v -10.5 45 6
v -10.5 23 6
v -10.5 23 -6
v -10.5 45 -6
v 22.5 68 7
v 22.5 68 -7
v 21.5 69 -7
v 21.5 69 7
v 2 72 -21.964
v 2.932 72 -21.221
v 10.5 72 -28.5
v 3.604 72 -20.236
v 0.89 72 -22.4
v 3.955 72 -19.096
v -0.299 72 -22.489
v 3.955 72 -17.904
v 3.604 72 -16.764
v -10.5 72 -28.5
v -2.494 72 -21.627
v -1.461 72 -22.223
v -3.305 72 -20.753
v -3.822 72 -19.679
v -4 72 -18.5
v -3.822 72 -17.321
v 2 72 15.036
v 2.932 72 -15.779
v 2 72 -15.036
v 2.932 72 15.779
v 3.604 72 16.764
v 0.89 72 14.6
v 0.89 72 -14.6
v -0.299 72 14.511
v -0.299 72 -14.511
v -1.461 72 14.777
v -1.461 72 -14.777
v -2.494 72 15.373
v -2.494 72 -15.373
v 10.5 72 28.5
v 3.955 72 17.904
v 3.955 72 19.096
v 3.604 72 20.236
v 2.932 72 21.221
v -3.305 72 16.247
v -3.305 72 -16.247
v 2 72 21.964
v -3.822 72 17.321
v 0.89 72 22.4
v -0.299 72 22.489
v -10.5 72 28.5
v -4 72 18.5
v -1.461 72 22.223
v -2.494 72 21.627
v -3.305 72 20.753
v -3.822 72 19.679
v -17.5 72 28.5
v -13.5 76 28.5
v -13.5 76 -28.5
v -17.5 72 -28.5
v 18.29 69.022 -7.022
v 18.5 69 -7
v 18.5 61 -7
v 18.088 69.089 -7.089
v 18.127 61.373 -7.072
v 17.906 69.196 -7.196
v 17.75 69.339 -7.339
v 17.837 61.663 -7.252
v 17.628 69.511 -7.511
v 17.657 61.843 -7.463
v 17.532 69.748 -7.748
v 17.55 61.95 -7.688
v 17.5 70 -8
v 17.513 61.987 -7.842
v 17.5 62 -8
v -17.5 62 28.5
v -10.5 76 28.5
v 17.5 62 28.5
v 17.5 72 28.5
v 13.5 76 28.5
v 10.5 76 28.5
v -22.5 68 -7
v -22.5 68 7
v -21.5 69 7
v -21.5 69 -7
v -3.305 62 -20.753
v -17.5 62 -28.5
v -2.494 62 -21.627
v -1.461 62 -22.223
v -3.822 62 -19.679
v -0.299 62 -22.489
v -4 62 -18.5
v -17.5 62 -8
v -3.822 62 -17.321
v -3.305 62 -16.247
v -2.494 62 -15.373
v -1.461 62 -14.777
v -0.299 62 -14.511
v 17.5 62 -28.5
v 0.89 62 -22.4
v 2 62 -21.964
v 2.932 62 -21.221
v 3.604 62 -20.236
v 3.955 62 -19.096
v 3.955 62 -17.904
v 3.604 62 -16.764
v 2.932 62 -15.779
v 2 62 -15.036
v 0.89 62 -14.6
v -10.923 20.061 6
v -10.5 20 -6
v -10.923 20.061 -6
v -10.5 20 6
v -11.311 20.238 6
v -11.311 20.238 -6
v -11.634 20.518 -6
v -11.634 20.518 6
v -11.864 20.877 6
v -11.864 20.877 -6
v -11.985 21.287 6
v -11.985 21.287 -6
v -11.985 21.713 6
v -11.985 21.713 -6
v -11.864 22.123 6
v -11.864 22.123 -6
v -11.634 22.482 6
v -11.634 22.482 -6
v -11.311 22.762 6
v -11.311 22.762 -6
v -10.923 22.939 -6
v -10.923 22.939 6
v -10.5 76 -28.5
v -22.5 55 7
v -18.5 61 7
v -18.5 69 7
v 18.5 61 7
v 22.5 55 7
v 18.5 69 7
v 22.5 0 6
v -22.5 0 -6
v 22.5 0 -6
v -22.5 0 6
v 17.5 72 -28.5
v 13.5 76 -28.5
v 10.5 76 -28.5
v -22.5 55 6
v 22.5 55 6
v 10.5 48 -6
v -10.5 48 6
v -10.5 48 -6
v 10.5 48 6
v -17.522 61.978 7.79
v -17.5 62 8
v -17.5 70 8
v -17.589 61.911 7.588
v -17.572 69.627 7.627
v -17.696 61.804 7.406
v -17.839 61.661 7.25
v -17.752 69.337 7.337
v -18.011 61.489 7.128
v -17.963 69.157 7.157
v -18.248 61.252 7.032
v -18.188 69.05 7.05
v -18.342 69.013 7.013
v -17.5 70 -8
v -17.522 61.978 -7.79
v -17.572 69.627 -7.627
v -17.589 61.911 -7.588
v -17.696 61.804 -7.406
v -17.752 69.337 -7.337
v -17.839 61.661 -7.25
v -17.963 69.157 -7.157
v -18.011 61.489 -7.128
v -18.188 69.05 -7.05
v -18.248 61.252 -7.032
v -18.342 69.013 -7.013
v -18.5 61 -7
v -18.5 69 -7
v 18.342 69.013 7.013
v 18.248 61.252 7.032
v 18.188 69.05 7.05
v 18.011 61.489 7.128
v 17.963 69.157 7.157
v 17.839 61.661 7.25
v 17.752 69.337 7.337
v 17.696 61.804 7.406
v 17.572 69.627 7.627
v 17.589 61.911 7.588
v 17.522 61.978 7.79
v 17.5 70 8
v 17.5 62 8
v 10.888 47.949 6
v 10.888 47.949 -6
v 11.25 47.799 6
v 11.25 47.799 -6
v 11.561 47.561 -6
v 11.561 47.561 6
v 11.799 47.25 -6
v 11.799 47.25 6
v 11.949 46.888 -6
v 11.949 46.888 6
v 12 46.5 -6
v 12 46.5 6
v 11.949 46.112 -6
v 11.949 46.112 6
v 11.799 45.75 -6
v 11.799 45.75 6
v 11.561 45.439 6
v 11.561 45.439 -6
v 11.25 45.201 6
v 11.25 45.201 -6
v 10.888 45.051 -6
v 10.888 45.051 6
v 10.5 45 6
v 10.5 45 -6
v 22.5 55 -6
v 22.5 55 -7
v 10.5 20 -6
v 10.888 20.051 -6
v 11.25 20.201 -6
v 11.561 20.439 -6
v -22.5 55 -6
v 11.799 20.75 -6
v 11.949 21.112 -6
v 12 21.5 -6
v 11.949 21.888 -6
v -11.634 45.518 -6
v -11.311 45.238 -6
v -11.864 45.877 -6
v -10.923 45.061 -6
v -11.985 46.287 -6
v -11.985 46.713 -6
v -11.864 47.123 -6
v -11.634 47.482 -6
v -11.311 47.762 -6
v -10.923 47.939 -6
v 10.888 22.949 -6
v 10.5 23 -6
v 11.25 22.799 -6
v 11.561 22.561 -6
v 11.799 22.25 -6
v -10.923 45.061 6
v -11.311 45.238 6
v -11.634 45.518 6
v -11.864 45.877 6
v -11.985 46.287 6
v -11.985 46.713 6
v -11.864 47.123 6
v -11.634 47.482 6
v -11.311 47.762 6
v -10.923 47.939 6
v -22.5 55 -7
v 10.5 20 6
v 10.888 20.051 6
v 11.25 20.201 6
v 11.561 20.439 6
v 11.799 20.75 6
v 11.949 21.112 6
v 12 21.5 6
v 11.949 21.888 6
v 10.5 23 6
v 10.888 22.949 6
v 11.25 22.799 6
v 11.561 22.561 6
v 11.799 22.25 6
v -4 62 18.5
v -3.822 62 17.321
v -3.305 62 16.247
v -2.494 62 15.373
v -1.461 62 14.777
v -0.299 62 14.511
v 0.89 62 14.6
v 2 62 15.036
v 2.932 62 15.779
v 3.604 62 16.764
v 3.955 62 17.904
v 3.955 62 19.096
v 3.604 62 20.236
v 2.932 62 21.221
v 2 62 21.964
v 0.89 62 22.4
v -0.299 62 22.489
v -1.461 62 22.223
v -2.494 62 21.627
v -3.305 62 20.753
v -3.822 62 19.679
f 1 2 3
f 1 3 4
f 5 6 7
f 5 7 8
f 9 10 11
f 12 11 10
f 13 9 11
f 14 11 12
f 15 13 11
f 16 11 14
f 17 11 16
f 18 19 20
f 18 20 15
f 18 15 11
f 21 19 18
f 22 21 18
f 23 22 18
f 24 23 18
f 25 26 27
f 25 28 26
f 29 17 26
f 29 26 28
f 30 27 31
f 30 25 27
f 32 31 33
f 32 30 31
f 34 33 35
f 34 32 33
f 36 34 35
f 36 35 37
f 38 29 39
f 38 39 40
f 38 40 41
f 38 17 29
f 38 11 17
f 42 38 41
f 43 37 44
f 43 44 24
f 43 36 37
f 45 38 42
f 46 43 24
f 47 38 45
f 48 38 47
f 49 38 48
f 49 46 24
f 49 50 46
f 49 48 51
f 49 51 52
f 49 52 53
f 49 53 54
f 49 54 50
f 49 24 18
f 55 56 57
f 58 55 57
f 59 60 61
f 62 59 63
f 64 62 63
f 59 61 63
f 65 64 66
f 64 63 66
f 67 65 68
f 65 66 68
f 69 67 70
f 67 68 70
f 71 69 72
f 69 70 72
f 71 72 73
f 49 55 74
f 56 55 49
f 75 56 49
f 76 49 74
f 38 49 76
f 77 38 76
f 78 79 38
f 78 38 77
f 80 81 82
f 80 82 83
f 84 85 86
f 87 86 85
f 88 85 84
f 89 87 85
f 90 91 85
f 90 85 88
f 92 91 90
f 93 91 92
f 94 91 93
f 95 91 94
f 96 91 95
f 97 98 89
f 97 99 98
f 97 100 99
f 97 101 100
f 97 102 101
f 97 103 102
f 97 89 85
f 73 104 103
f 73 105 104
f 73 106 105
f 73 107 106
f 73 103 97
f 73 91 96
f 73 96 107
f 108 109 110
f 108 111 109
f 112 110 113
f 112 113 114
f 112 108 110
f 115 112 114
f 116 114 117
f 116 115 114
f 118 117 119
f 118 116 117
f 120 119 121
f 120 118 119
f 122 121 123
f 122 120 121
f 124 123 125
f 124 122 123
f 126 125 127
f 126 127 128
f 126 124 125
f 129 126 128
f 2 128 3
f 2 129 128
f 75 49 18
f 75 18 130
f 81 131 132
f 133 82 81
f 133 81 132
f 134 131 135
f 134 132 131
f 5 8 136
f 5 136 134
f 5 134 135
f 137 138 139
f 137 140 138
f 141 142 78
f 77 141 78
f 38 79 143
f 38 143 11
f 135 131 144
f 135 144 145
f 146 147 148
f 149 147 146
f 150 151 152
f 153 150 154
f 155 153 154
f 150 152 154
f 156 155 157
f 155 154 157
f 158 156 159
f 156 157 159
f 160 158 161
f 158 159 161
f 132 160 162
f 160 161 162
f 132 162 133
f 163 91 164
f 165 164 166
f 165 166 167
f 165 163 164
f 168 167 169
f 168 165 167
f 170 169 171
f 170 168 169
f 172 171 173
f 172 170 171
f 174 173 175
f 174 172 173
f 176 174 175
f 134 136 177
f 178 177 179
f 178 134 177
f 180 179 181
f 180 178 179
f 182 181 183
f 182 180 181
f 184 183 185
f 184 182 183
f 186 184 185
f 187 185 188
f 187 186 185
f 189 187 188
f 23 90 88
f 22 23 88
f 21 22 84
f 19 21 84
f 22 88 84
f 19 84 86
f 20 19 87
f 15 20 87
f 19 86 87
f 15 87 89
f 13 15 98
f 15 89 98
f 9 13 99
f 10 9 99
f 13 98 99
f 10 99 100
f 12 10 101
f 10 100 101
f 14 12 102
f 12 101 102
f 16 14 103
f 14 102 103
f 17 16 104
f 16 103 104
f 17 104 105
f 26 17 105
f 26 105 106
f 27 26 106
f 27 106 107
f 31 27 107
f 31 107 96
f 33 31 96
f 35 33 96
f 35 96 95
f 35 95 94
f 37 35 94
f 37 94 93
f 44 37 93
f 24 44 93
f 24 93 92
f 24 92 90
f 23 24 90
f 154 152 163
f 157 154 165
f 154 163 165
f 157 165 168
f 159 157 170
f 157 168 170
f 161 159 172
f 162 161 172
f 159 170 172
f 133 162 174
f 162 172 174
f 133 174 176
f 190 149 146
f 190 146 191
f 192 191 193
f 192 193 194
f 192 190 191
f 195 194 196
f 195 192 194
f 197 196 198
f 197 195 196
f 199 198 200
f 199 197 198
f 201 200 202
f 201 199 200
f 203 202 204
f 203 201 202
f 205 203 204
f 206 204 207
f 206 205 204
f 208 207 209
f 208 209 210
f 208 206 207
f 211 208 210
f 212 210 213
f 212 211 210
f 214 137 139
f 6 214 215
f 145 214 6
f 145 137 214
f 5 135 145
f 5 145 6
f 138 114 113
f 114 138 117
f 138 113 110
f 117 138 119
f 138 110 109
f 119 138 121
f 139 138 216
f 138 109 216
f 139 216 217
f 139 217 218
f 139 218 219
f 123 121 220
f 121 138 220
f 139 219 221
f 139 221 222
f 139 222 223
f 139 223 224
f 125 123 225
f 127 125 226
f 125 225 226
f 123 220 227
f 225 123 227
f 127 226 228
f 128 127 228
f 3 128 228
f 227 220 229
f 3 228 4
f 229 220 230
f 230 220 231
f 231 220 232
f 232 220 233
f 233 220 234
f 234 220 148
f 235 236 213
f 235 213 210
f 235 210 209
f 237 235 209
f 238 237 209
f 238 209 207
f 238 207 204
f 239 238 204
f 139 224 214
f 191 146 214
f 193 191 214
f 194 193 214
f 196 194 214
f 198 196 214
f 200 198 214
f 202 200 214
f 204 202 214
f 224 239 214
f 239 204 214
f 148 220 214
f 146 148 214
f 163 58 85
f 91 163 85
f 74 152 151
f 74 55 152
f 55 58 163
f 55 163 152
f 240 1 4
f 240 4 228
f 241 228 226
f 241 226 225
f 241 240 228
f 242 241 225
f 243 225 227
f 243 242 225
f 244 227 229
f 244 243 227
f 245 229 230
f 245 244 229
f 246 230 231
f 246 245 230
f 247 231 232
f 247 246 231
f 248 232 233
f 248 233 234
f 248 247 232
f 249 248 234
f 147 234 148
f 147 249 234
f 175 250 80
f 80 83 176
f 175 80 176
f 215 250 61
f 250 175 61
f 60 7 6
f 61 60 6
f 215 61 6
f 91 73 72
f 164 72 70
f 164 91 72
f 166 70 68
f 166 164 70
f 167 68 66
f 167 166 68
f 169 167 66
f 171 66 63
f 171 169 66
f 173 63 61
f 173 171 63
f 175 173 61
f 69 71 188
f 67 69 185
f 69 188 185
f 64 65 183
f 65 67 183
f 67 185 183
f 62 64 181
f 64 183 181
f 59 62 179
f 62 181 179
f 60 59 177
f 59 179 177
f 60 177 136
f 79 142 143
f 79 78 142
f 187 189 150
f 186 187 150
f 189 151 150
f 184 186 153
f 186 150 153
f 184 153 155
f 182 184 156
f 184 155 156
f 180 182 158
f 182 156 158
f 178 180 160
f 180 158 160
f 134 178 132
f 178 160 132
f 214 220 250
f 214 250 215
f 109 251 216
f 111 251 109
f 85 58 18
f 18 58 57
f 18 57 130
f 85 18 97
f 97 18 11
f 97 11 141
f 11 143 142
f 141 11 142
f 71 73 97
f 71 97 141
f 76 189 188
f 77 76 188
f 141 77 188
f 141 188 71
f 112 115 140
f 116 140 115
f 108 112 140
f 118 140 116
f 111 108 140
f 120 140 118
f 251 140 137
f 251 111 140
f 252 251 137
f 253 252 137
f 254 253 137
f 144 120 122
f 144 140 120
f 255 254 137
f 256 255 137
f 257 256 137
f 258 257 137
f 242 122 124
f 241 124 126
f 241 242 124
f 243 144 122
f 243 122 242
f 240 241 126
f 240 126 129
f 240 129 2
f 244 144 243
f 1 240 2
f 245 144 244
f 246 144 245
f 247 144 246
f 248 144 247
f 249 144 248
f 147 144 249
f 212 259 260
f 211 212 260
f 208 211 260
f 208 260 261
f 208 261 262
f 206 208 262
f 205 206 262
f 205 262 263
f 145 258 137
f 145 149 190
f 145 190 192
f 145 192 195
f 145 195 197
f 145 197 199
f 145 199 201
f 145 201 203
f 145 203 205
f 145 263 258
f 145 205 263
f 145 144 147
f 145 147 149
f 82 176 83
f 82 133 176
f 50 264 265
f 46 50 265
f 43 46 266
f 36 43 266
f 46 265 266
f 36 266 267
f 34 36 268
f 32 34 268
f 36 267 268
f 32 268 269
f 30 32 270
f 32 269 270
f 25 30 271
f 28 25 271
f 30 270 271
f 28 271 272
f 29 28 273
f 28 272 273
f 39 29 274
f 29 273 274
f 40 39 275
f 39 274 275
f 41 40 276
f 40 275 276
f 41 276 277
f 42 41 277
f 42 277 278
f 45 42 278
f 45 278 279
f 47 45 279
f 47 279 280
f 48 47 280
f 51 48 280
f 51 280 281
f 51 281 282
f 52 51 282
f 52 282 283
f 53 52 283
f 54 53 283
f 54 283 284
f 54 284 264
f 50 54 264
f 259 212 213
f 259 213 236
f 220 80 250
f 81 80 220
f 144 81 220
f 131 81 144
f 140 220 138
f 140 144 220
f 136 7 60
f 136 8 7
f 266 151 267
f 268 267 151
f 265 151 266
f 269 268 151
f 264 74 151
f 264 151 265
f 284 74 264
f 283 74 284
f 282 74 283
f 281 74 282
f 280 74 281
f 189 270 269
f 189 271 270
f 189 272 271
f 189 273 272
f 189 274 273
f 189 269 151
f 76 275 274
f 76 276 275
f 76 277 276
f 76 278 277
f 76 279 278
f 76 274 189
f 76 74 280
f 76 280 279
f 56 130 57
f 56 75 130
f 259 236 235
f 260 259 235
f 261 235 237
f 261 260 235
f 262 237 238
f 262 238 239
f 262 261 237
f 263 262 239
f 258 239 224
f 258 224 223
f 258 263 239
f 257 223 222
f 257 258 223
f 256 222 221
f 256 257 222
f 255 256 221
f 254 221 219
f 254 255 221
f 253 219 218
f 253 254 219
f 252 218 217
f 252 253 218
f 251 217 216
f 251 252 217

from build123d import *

# Parameters (mm, degrees)
SKETCH_2_W      = 45
SKETCH_2_H      = 55
EXTRUDE_1_DEPTH = 6
EXTRUDE_2_DEPTH = 7
EXTRUDE_3_DEPTH = 28.5
CHAMFER_1_SIZE  = 4
HOLE_WIZARD_1_D = 8
FILLET_1_R      = 1
CHAMFER_2_SIZE  = 1


with BuildPart() as part:
    # 스케치2 → 보스-돌출1 (new, symmetric)
    with BuildSketch(Plane.XY):
        with Locations((0, 27.5)):
            Rectangle(SKETCH_2_W, SKETCH_2_H)
        with BuildLine():
            Line((-10.5, 48), (10.5, 48))
            ThreePointArc((10.5, 48), (12, 46.5), (10.5, 45))
            Line((10.5, 45), (10.5, 23))
            ThreePointArc((10.5, 23), (12, 21.5), (10.5, 20))
            Line((10.5, 20), (-10.5, 20))
            ThreePointArc((-10.5, 20), (-12, 21.5), (-10.5, 23))
            Line((-10.5, 23), (-10.5, 45))
            ThreePointArc((-10.5, 45), (-12, 46.5), (-10.5, 48))
        make_face(mode=Mode.SUBTRACT)
    extrude(amount=EXTRUDE_1_DEPTH, both=True)

    # 스케치2<5> → 보스-돌출2 (add, symmetric)
    with BuildSketch(Plane.XY):
        Polygon((-22.5, 69), (-22.5, 55), (22.5, 55), (22.5, 69), (17.5, 69), (17.5, 62), (-17.5, 62), (-17.5, 69), align=None)
    extrude(amount=EXTRUDE_2_DEPTH, both=True)

    # 스케치2<6> → 보스-돌출3 (add, symmetric)
    with BuildSketch(Plane.XY):
        Polygon((-17.5, 62), (17.5, 62), (17.5, 76), (10.5, 76), (10.5, 72), (-10.5, 72), (-10.5, 76), (-17.5, 76), align=None)
    extrude(amount=EXTRUDE_3_DEPTH, both=True)

    # 모따기1
    chamfer_1_edges = [part.edges().sort_by_distance(p)[0] for p in [
        (17.5, 76, 0),
        (-17.5, 76, 0),
    ]]
    chamfer(chamfer_1_edges, length=CHAMFER_1_SIZE)

    # 구멍1 (through all)
    with Locations(Plane(origin=(0, 72, 0), x_dir=(1, 0, 0), z_dir=(0, 1, 0))):
        with Locations((0, 18.5), (0, -18.5)):
            Hole(HOLE_WIZARD_1_D / 2)

    # 필렛1
    fillet_1_edges = [part.edges().sort_by_distance(p)[0] for p in [
        (0, 62, 7),
        (-17.5, 65.5, 7),
        (-17.5, 69, 0),
        (-17.5, 65.5, -7),
        (0, 62, -7),
        (17.5, 65.5, -7),
        (17.5, 65.5, 7),
        (17.5, 69, 0),
    ]]
    fillet(fillet_1_edges, radius=FILLET_1_R)

    # 모따기2
    chamfer_2_edges = [part.edges().sort_by_distance(p)[0] for p in [
        (-22.5, 69, 0),
        (22.5, 69, 0),
    ]]
    chamfer(chamfer_2_edges, length=CHAMFER_2_SIZE)


solid = part.part
